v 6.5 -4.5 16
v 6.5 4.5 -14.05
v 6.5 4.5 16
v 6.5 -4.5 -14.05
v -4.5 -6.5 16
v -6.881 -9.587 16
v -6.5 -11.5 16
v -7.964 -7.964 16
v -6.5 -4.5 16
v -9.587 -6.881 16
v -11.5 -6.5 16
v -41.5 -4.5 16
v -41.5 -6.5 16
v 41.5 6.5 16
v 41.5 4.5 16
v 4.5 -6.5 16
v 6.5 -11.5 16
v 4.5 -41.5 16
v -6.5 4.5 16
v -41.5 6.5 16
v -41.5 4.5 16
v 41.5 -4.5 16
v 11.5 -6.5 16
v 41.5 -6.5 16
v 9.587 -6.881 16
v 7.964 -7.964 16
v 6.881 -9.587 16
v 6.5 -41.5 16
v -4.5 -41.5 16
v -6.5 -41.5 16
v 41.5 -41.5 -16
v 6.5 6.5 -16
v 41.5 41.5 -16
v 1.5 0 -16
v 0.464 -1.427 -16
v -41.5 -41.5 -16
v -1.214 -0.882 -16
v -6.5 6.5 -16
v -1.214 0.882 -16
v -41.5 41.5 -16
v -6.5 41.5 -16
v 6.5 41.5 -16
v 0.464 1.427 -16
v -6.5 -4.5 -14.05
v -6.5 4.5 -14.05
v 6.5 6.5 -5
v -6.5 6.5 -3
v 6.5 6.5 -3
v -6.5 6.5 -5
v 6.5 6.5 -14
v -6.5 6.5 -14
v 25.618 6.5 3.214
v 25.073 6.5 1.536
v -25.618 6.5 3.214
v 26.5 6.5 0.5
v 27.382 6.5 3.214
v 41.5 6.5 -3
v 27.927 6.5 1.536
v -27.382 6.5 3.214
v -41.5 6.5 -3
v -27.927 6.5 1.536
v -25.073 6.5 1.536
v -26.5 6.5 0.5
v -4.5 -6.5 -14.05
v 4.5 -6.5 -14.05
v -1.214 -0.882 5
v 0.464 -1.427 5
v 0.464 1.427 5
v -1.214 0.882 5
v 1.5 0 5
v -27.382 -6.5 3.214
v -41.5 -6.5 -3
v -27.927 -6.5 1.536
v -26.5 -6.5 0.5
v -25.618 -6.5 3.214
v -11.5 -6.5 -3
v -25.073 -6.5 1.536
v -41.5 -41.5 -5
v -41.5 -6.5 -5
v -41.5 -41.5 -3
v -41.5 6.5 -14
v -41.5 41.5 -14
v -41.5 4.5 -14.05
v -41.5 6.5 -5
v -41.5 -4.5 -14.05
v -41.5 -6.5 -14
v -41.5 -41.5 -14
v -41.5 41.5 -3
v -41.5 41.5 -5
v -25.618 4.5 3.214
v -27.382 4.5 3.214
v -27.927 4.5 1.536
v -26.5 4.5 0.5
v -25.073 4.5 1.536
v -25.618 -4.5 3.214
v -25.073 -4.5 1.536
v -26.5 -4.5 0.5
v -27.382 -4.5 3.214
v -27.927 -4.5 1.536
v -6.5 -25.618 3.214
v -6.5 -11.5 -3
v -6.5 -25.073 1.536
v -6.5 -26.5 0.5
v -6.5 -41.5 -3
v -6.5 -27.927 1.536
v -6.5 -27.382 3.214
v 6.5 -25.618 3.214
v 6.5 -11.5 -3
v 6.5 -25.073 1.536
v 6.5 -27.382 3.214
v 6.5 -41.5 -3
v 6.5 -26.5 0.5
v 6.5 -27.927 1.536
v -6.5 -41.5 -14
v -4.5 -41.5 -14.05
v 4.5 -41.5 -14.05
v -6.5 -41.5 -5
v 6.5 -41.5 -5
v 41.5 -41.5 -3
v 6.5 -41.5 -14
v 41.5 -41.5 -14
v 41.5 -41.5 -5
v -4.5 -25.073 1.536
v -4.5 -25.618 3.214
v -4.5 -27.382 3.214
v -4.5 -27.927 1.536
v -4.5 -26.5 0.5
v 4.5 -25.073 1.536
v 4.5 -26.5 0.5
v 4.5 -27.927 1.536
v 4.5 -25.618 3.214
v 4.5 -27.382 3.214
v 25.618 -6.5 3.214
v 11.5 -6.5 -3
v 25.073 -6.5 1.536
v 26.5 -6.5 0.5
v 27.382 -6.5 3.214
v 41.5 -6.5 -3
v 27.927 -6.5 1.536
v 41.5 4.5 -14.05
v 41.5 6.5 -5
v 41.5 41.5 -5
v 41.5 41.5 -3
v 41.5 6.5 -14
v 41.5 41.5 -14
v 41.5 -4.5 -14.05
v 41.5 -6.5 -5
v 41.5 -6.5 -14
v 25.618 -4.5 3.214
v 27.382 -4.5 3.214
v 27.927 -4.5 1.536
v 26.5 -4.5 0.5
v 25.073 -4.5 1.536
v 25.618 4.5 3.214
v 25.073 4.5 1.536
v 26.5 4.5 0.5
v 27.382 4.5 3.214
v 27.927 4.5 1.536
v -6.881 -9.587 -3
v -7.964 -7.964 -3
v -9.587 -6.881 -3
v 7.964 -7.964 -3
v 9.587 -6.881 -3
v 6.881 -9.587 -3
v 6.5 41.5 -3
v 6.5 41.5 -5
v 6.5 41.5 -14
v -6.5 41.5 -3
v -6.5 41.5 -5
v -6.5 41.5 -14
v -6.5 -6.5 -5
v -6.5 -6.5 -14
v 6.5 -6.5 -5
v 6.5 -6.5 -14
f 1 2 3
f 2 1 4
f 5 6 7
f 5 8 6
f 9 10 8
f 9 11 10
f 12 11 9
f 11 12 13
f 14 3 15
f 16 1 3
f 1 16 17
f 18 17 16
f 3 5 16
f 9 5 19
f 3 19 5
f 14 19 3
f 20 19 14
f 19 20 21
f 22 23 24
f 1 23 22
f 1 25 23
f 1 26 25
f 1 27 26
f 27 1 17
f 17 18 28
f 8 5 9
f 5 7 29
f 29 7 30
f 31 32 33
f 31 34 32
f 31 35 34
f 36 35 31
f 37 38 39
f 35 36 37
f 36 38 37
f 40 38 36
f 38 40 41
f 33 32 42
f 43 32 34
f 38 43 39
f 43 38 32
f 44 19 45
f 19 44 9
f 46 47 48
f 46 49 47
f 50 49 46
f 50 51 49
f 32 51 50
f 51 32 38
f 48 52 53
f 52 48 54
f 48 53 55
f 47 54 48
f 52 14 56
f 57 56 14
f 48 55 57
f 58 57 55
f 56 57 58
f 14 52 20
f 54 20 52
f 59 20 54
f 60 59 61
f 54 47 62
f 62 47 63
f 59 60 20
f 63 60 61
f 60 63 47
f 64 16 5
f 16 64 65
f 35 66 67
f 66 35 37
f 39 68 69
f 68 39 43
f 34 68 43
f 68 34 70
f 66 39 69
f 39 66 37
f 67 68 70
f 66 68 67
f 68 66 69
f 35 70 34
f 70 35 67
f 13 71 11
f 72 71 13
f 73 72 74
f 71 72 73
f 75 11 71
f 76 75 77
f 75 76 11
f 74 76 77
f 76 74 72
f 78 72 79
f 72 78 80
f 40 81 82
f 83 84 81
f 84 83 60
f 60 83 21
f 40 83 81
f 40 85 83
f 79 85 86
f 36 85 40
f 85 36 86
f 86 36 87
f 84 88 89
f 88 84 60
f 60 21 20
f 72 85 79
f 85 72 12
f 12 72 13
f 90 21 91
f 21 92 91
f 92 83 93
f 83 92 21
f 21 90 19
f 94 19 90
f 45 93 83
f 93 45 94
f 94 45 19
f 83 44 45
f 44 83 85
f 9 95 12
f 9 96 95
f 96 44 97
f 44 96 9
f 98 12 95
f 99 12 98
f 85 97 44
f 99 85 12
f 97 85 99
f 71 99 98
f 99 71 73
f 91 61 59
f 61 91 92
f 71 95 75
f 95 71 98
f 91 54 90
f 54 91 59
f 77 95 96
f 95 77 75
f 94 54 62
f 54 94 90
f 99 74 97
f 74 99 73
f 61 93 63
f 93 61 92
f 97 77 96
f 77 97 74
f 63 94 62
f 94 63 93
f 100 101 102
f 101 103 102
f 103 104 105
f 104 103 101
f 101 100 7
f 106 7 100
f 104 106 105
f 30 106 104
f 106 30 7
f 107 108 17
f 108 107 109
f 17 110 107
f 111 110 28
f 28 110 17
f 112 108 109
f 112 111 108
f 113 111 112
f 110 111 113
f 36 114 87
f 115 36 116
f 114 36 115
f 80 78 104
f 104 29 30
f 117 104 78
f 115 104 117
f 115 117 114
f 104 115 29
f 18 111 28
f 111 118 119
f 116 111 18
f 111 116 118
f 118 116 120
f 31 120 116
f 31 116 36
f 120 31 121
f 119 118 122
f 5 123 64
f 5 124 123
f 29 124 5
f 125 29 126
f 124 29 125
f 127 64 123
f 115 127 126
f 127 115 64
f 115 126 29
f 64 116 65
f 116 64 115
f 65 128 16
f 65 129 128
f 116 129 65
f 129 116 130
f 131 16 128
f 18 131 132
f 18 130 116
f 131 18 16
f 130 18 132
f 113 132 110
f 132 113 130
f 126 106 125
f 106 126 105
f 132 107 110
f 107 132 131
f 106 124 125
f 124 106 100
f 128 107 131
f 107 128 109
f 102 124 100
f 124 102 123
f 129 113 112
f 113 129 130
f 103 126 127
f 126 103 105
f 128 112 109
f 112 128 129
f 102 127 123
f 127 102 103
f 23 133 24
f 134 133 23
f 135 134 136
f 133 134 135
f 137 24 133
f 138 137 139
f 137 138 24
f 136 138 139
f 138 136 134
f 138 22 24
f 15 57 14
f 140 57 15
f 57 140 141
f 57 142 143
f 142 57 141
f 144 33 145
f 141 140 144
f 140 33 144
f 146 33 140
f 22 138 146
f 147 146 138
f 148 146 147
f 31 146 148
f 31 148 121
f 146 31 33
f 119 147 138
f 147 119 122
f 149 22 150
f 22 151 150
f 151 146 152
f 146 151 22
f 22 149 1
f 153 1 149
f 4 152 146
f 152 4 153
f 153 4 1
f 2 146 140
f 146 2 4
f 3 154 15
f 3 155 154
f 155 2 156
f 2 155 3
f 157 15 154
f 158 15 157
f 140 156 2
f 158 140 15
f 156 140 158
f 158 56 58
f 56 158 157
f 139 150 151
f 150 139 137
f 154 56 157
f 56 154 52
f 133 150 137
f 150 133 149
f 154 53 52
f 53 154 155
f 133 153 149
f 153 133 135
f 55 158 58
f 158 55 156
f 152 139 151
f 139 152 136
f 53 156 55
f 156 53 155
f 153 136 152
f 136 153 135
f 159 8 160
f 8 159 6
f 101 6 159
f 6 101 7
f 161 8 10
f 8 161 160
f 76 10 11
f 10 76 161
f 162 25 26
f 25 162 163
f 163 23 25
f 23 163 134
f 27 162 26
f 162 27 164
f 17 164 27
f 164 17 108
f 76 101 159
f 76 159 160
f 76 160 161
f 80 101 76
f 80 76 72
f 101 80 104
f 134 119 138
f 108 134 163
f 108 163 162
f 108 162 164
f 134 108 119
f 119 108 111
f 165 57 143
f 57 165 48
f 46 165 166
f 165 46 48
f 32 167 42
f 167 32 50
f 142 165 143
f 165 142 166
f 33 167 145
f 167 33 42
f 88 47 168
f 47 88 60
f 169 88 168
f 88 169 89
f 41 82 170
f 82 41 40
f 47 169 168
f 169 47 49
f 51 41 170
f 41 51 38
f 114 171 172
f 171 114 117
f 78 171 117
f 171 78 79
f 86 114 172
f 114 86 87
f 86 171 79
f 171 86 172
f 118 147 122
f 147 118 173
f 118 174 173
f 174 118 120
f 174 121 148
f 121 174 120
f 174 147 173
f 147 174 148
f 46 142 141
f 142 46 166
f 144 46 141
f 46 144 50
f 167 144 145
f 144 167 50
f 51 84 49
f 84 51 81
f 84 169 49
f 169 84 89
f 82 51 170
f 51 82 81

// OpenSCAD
/* [Basics] */
//how many boards do you want to connect? (1-4; otherwise experimental)
connectors_amount = 3;
//angle between connectors..(default is 90, rest is experimental)
connectors_angle = 90;
//enter the thickness of your boards (0 for solid parts, but then: shell thickness ok?)
board_thickness = 9;
//how long should the cutout for the board be?
notch_lenght = 35;
//depth of the cutout
notch_depth = 30;
//thickness of the walls
shell_thickness = 2;
//inner edges fillet (0 for none; experimental)
edges_fillet = 7; //[0:10]
/* [Bottom Part] */
//false, if no foot is required
its_a_bottom_part = "false"; //[true, false]
//false, if the 1-connector-bottom-parts slot should face to the side
straight_1_connector_bottom = "false"; //[true, false]
//how thick should the foot be?
ground_offset = 16;
//what width should the foot have? (P
foot_width = 30; //[0;100]
ground_surface = ((notch_lenght+shell_thickness)*2 + board_thickness)* foot_width/100;
/* [Holes] */
//true, if there should be holes in the middle of the slotpartkindofthing
insert_hole_for_board = "true"; //[true, false]
//diameter of the hole
board_hole_size = 3;
//true, if there is shold be a hole for screws for some diagonal braces
insert_hole_for_brace = "true"; //[true, false]
//size of said holes
brace_hole_size = 3;
//depth of said holes
brace_hole_depth = 20; 
/* [Back] */
back_parts_amount = 4; //[0;4]
/* [Edge] */
// polynomial that goes through (1,1), (2,1), (3,2), (4,3) for number of spaces between rectangular notches
    //y(x) = pow(x, 2) / 2 - 3 * x / 2 + 2    
spaces = (pow(connectors_amount, 2) / 2) - (3 * connectors_amount / 2) + 2;

module centerpiece(){
        if((connectors_amount < 5) && (connectors_angle == 90)){
                cube([board_thickness + shell_thickness * 2, board_thickness + (shell_thickness*2), notch_depth + shell_thickness], center = true);}    
        else{
            cylinder(h = notch_depth, r = board_thickness + shell_thickness/2, center = true);
        }
}

module brace_hole(){
    if (insert_hole_for_brace == "true"){
        difference(){
            centerpiece();
            translate([0, 0, - notch_depth / 2 - 1]) cylinder (h = brace_hole_depth + 1, r = brace_hole_size / 2, center = false, $fn=brace_hole_size + 2);
        }
    } else{
        centerpiece();
    }
}

module ground_piece(){
    if (its_a_bottom_part == "true" && connectors_amount < 4){
        translate([0, (ground_offset + board_thickness) / 2 + shell_thickness, 0])
        cube([ground_surface, ground_offset, notch_depth + shell_thickness], center = true);
    }
}
                    
module notch(){
    difference(){
        //centerpiece();
        translate([0, (notch_lenght + board_thickness) / 2 + shell_thickness, 0])
            cube([board_thickness + shell_thickness * 2, notch_lenght + shell_thickness*0, notch_depth + shell_thickness], center = true);
        translate([0, notch_lenght / 2 + board_thickness, shell_thickness / 2 + 1])
            cube([board_thickness, notch_lenght * 2, notch_depth + shell_thickness + 0.1], center = true);
    }
}


module board_hole(){
    if (insert_hole_for_board == "true"){
        difference(){
            notch();
    translate([0, notch_lenght / 2 + board_thickness, shell_thickness / 2 + 1]) rotate([0,90,0]) cylinder(h=board_thickness + 2*shell_thickness+0.1,r=board_hole_size/2, center=true);}
}
else{
    notch();}
}

module rounded_corner(){
    difference(){
    translate([-(board_thickness + 2 * shell_thickness + notch_lenght / edges_fillet) / 2,-(board_thickness + 2 * shell_thickness + notch_lenght / edges_fillet) / 2, 0]) 
        cube([notch_lenght / edges_fillet, notch_lenght / edges_fillet, notch_depth+shell_thickness], center = true);
    translate([-(board_thickness + 2 * shell_thickness + 2* notch_lenght / edges_fillet)/2,-(board_thickness + 2 * shell_thickness + 2*notch_lenght / edges_fillet) / 2, 0])  
        cylinder(h = notch_depth+shell_thickness+0.1, r = notch_lenght/edges_fillet, center = true);;}
    
}

module main(){
    union(){
    brace_hole(); 
    for (i = [1 : connectors_amount]){
        rotate([0, 0, connectors_angle * i]) board_hole();}
    if (connectors_amount > 1 && connectors_amount < 8 && connectors_angle == 90){
        
        for (i = [1 : pow(2, connectors_amount - 2)]){
            rotate([0, 0, (i - 1) * connectors_angle]) rounded_corner();
        }
    }
    if (its_a_bottom_part && (connectors_amount == 1)){
        if (straight_1_connector_bottom == "false" && its_a_bottom_part == "true"){
        translate([(board_thickness + 2 * shell_thickness - ground_surface) / 2, 0, 0]) ground_piece();}    
        else{
            translate([(ground_offset + board_thickness) / 2 + shell_thickness, 0, 0]) cube([ground_offset, board_thickness + 2 * shell_thickness, notch_depth + shell_thickness], center = true);}
    }
    if (its_a_bottom_part && (connectors_amount == 2)){
    translate([(board_thickness + 2 * shell_thickness - ground_surface) / 2, 0, 0]) ground_piece();}
    if (its_a_bottom_part && (connectors_amount == 3)){
        ground_piece();}
    }
}

module add_back_notch(){
    if (back_parts_amount > 0){
difference(){
union(){
main();
    for (i = [1 : back_parts_amount]){
        //spaces = (pow(i, 2) / 2) - (3 * i / 2) + 2;
        //echo(spaces);
        rotate([0, 0, (i - 1) * connectors_angle])
translate([-(board_thickness+shell_thickness*2+notch_lenght)/2, -(notch_lenght+board_thickness+2*shell_thickness)/2,-(notch_depth-board_thickness-shell_thickness)/2]) cube([notch_lenght, notch_lenght,board_thickness+2*shell_thickness], center = true);
    }}/*
    for (i = [1 : pow(2, connectors_amount - 2)]){
        //echo(i)
            rotate([0, 0, (i - 1) * connectors_angle])
translate([-(board_thickness+shell_thickness*2+notch_lenght)/2, -(notch_lenght+board_thickness+2*shell_thickness)/2,-(notch_depth-board_thickness-shell_thickness)/2]) cube([notch_lenght, notch_lenght,board_thickness+2*shell_thickness], center = true);
}*/
for (i = [1 : back_parts_amount]){
        //spaces = (pow(i, 2) / 2) - (3 * i / 2) + 2;
        //echo(spaces);
        rotate([0, 0, (i-1) * connectors_angle])
translate([-(board_thickness + shell_thickness * 2 + notch_lenght) / 2 - 1, -(notch_lenght + board_thickness + 2 * shell_thickness) / 2-1,-(notch_depth - board_thickness - shell_thickness) / 2]) cube([notch_lenght+2, notch_lenght+2, board_thickness], center = true);}}}
}
//    rotate([0, -90, 90]) translate([-(notch_depth - board_thickness - shell_thickness * 2 + shell_thickness) / 2, 0, (board_thickness + notch_depth + shell_thickness)/2+shell_thickness]) board_hole();


add_back_notch();

//TODO: center board hole
//TODO: make round edges optional, also size
//TODO: 
